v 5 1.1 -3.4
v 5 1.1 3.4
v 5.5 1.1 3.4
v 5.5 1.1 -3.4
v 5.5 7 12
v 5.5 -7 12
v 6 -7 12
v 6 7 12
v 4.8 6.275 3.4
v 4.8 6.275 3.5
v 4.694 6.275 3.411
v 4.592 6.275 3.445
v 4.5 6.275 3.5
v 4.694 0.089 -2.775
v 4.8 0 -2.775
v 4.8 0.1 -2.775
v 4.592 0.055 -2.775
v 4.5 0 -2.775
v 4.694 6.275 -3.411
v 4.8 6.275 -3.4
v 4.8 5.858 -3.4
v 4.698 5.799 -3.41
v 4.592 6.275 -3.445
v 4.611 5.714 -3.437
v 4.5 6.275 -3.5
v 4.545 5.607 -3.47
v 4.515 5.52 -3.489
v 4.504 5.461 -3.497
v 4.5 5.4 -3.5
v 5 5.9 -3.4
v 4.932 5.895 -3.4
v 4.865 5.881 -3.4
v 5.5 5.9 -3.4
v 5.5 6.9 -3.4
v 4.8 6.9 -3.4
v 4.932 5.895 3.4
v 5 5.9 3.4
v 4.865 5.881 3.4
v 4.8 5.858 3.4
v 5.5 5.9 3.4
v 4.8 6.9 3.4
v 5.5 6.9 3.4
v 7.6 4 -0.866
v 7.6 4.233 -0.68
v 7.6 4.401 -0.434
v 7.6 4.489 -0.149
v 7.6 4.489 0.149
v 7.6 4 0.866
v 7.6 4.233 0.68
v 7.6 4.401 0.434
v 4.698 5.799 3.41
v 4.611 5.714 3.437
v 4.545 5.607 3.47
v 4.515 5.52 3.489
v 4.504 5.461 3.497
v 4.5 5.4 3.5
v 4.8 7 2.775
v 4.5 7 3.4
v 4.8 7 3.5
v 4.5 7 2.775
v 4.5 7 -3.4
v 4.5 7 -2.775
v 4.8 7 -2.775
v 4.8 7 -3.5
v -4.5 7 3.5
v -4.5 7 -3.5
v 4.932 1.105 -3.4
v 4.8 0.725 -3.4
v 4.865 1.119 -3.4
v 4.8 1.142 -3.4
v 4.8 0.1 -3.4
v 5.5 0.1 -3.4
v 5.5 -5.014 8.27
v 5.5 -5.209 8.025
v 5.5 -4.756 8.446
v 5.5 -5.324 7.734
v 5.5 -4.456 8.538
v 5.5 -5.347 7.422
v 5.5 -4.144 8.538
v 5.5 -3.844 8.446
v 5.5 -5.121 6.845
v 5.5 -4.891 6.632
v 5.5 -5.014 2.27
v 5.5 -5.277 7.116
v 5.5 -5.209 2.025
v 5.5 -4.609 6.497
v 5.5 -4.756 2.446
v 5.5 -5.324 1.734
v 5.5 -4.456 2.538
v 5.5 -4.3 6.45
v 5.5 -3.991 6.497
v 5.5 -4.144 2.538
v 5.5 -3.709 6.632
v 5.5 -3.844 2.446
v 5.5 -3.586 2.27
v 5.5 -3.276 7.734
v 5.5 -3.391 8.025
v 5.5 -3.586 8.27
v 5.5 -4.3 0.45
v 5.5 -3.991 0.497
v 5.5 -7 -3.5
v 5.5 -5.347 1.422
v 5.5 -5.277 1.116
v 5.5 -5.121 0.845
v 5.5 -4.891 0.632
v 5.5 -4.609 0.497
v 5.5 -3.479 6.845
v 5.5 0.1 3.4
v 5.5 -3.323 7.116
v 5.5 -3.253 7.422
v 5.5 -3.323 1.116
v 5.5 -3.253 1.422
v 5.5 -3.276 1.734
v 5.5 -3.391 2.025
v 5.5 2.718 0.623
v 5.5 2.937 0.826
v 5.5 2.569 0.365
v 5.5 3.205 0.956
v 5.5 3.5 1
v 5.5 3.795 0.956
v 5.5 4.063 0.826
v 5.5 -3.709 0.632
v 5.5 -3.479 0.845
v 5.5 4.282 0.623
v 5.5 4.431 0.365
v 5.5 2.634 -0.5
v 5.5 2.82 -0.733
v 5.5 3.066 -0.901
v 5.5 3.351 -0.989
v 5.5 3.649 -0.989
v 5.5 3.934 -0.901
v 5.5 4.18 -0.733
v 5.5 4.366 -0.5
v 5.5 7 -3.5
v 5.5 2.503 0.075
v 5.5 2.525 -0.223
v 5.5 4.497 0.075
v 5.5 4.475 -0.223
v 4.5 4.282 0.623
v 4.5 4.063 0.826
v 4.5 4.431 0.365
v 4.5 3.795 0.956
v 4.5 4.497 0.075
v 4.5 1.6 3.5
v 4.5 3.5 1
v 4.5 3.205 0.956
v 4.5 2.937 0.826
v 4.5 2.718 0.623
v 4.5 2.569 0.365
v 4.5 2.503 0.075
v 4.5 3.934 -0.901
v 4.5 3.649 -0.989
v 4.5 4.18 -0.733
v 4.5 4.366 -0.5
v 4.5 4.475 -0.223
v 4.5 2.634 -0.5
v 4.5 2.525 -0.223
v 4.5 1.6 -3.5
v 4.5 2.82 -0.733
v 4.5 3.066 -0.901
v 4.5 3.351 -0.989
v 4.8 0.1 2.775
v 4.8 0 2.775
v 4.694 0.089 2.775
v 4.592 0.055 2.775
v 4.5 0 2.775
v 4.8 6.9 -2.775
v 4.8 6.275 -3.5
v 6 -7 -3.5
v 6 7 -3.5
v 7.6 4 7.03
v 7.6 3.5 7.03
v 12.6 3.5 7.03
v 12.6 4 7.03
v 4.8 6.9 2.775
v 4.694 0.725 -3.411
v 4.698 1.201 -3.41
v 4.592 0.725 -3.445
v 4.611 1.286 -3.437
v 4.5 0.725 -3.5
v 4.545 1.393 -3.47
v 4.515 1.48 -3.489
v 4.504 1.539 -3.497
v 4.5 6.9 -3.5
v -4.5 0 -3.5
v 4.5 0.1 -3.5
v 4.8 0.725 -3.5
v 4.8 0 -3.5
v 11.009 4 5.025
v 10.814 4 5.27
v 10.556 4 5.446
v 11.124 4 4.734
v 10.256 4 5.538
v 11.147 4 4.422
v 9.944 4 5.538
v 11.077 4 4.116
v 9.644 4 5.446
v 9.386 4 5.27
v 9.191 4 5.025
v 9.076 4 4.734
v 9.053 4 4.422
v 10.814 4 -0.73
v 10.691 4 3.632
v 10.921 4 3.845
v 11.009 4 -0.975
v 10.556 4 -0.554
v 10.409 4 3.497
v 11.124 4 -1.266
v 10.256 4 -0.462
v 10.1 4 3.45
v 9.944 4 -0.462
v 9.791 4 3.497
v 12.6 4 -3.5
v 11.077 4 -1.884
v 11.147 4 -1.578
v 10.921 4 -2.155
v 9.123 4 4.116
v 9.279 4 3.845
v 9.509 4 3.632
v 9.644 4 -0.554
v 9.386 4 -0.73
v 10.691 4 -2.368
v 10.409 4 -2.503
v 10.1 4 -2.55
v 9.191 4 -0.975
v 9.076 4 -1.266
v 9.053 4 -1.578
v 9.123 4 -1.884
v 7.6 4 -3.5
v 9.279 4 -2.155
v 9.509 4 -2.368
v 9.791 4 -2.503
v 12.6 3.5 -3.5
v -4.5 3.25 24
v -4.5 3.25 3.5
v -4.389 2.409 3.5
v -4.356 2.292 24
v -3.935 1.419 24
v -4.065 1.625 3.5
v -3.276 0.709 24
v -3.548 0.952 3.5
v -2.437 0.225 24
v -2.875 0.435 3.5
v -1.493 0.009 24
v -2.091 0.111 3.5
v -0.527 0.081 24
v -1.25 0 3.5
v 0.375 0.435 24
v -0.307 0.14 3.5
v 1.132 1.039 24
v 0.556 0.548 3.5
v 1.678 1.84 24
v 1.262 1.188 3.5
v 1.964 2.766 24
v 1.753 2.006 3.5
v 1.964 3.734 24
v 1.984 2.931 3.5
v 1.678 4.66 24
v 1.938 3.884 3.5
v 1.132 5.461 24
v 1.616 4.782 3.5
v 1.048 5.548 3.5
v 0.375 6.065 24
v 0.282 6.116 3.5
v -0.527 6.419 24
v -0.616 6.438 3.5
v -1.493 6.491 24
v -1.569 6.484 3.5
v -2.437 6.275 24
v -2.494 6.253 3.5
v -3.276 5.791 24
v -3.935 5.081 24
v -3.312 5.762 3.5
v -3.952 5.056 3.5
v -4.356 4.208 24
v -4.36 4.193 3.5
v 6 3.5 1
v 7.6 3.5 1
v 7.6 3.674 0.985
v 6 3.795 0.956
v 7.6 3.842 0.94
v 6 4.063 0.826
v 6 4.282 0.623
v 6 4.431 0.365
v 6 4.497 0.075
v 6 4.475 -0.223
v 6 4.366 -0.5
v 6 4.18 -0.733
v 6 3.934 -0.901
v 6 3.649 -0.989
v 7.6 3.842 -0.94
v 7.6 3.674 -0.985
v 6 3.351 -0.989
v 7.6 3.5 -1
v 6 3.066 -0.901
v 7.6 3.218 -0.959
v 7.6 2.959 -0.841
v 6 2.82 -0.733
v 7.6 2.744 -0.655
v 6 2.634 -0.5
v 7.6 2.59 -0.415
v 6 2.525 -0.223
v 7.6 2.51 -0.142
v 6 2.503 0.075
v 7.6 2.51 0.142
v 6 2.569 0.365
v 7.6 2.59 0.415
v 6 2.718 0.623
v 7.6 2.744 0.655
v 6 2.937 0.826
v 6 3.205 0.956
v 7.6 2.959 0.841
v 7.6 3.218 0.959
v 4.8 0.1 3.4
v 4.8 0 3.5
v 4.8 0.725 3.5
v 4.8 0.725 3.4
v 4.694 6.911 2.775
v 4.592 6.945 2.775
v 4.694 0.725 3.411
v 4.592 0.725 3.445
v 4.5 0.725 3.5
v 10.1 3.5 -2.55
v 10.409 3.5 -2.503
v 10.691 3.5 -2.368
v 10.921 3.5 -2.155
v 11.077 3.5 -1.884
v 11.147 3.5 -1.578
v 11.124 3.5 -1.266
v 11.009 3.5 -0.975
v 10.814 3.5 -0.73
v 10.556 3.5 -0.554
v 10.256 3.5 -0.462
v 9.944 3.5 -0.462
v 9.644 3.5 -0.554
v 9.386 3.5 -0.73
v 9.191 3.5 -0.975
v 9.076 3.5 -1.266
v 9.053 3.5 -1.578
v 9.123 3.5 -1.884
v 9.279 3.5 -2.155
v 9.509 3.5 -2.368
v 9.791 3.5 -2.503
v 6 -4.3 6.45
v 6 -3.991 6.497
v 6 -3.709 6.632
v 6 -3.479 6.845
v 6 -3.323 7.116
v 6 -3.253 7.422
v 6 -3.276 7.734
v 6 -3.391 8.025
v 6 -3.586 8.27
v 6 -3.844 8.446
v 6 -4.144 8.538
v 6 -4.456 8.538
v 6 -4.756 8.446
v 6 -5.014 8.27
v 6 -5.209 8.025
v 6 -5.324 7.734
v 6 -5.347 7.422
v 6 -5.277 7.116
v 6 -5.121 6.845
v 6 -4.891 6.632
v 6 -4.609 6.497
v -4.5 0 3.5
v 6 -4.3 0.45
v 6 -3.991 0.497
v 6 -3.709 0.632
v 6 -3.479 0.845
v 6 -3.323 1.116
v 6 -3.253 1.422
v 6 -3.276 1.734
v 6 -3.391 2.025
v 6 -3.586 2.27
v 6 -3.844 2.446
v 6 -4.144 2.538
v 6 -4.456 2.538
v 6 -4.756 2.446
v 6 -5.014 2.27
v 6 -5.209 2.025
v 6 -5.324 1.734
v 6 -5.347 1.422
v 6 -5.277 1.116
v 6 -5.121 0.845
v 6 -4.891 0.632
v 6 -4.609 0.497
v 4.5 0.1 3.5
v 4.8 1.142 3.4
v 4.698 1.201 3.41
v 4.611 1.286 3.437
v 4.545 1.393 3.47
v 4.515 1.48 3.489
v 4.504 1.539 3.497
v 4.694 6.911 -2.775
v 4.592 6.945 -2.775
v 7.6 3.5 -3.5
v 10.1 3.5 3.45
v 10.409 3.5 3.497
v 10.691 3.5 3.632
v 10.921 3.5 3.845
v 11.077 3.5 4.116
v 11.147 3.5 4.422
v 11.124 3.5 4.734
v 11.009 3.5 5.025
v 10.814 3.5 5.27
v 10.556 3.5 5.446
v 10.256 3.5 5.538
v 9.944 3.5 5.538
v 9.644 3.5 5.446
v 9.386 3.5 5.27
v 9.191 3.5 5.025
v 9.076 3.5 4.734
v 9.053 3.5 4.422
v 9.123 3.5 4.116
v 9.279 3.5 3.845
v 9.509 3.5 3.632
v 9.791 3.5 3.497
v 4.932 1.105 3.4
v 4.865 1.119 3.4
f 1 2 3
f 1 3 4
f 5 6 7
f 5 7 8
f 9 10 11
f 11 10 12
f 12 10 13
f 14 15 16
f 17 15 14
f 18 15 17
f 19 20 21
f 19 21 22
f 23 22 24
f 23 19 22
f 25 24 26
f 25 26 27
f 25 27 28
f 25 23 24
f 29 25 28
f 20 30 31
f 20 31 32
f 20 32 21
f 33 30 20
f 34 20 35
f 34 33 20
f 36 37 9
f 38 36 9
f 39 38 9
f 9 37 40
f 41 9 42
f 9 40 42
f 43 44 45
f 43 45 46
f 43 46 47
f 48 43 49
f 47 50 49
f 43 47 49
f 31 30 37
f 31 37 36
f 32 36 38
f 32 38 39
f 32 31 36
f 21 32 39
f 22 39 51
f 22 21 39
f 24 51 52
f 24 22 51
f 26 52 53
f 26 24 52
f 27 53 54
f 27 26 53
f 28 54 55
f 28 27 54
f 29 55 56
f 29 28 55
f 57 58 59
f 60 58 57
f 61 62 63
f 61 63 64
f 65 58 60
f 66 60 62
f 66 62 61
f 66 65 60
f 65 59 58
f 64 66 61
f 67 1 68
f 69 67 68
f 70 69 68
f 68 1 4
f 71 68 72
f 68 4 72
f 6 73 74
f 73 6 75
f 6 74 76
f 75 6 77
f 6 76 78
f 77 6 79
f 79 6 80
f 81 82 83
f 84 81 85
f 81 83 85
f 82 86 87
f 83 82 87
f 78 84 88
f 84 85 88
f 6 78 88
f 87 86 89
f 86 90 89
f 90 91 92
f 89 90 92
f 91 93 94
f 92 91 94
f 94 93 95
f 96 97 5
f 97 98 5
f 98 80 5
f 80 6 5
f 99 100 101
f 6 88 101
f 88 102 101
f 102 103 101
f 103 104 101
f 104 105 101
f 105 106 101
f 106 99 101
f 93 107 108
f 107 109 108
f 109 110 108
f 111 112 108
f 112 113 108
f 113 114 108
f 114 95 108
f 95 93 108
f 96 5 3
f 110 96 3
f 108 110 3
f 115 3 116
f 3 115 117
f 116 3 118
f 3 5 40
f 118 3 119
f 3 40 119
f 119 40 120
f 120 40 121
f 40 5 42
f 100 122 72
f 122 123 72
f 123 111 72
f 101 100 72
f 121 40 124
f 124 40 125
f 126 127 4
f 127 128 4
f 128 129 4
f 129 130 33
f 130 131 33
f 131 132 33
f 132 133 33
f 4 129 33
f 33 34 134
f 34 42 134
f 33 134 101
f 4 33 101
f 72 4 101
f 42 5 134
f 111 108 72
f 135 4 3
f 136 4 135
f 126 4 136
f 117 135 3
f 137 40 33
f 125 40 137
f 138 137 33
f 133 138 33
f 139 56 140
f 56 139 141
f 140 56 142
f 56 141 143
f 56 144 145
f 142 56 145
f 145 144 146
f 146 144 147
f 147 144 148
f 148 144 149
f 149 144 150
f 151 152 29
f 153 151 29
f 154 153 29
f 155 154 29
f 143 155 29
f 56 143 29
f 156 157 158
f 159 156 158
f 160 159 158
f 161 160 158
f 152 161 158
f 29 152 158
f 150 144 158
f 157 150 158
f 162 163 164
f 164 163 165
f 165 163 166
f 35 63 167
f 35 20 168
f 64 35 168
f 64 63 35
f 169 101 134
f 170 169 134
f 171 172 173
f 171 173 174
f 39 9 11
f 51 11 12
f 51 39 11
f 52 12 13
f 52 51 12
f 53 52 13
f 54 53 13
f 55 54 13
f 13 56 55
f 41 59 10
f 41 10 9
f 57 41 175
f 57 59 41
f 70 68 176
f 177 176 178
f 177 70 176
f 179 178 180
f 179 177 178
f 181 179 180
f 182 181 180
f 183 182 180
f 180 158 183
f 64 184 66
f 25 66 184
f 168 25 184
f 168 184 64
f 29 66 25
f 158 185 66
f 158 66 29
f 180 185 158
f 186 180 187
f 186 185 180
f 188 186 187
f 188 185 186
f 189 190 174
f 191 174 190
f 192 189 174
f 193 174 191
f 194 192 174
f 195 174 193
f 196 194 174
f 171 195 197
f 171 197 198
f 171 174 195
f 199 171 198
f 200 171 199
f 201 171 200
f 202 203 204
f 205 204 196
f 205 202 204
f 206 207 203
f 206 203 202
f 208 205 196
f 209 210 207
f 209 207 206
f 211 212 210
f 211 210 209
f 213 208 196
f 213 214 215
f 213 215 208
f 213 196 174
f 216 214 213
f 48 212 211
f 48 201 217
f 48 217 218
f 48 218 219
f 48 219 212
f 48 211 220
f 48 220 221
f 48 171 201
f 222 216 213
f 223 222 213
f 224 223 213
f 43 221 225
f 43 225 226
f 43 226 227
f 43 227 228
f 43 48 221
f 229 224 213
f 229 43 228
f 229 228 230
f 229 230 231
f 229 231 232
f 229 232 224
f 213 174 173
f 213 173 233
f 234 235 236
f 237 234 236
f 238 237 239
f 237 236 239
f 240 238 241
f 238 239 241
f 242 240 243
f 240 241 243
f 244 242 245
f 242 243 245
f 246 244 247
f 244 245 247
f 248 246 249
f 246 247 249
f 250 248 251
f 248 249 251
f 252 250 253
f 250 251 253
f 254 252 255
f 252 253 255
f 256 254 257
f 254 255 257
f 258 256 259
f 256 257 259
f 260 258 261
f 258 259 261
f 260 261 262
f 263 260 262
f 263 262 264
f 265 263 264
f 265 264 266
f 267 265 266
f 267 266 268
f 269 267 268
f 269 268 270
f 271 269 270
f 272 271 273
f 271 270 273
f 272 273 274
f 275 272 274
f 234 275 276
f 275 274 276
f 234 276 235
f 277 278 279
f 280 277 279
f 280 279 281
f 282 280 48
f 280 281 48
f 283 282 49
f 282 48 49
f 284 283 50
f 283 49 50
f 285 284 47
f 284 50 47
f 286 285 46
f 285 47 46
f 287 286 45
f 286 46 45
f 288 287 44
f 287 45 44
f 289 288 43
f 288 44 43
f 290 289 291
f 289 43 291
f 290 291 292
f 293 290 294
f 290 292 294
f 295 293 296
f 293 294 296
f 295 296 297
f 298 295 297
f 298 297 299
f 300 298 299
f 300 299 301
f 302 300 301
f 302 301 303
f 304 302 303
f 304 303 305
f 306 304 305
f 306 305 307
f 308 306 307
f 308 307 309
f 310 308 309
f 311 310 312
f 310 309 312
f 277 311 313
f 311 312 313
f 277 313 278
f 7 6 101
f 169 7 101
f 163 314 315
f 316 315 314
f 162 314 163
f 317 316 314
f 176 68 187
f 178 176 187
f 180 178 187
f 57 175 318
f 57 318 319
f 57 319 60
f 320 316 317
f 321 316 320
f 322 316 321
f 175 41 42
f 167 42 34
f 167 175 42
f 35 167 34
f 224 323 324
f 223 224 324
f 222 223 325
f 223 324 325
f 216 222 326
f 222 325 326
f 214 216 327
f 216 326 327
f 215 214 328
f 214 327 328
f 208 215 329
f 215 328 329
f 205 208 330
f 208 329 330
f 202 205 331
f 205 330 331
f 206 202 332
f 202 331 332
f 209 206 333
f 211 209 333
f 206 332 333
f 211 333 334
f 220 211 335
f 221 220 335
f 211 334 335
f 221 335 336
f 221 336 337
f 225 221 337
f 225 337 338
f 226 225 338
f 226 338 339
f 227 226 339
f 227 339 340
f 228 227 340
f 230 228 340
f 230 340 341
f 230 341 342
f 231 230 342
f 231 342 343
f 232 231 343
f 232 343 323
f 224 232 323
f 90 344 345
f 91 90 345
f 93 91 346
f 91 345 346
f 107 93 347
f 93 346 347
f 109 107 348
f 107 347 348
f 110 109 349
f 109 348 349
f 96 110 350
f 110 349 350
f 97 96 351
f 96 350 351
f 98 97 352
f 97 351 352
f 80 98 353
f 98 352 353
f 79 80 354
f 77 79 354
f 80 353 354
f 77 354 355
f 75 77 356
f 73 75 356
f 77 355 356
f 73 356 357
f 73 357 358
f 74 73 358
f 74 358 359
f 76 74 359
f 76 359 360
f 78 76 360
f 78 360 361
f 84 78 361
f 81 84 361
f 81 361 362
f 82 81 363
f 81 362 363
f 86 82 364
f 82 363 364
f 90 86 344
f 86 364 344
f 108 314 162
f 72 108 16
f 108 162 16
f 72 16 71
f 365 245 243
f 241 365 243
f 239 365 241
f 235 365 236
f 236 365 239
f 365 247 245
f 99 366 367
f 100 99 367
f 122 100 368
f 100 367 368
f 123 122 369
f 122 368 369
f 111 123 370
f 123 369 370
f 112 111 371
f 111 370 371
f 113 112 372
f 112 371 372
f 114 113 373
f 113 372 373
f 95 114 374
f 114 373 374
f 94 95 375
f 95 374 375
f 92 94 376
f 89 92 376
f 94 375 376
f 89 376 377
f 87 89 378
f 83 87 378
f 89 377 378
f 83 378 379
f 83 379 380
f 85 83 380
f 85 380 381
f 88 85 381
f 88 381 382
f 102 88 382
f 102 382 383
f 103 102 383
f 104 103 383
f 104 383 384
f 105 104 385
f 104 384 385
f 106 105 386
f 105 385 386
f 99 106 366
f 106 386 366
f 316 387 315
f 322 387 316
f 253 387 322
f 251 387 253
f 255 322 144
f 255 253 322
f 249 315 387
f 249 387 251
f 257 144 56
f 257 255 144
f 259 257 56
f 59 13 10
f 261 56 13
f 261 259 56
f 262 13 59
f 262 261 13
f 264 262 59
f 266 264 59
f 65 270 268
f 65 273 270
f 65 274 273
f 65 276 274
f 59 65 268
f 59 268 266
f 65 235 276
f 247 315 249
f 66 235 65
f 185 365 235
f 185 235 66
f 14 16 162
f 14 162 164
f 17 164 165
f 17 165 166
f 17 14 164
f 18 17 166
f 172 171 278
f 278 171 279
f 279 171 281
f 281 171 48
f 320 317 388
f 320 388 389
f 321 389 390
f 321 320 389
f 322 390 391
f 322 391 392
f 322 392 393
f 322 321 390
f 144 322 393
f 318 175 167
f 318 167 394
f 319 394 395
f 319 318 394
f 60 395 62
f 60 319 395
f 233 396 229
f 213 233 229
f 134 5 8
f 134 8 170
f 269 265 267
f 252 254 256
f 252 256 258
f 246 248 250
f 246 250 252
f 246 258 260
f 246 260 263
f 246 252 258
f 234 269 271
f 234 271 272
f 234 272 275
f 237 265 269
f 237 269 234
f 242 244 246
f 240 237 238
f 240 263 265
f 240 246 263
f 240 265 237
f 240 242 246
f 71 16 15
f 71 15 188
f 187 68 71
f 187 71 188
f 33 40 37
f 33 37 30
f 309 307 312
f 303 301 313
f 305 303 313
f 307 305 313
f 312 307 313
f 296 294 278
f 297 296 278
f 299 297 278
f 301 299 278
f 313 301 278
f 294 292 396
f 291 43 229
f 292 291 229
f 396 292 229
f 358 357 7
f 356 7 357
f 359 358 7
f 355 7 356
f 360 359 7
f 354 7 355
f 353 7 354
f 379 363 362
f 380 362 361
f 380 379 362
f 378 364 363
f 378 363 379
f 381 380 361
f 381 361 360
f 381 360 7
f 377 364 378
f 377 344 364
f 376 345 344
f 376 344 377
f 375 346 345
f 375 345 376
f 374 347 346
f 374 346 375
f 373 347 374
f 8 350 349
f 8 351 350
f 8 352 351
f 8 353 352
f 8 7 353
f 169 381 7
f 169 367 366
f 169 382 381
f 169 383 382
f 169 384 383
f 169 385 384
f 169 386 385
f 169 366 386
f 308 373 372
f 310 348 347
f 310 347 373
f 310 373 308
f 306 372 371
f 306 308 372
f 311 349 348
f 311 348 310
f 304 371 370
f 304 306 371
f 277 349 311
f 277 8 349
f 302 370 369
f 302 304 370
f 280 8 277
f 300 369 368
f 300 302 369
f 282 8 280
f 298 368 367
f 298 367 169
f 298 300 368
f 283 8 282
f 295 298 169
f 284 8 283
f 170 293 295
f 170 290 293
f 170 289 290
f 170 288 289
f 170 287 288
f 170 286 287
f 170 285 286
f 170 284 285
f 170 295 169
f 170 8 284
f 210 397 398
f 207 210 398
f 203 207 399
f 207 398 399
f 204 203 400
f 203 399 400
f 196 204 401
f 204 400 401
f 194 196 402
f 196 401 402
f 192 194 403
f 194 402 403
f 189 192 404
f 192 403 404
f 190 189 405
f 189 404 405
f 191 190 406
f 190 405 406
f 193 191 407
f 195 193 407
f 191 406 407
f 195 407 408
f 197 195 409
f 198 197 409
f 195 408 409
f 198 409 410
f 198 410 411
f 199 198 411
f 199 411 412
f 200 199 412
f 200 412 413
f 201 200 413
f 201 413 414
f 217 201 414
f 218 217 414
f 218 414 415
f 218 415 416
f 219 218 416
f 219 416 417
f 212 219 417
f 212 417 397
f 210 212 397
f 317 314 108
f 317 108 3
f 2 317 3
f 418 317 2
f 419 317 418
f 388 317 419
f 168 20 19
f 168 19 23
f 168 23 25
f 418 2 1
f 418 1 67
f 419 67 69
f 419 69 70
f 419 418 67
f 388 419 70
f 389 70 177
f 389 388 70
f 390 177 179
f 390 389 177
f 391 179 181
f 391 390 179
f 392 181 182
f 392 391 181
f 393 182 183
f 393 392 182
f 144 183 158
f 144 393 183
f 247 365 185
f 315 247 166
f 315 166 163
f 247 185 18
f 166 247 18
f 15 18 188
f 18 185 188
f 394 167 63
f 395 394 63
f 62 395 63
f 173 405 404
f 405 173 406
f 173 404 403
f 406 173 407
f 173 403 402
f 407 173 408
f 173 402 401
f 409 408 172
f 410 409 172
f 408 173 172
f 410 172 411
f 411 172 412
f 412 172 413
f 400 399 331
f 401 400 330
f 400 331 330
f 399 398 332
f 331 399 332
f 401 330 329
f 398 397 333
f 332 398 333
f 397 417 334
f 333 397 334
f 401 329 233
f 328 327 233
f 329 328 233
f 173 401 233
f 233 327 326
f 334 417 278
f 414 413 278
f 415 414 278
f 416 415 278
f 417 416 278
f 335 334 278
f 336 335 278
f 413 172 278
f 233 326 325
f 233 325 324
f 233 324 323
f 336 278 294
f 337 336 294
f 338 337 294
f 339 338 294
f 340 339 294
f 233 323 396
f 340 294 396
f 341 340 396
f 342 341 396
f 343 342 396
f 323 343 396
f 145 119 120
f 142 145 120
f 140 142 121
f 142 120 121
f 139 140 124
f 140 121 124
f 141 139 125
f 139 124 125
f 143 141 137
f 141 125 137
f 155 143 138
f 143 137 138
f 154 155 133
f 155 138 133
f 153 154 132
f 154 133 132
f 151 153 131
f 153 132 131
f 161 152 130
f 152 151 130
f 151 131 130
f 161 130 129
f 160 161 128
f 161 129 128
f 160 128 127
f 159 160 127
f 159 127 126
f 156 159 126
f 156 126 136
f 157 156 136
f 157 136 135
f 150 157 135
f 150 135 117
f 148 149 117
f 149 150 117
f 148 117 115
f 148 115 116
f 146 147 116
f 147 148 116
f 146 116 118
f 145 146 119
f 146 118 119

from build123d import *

# Parameters (mm, degrees)
SKETCH1_W            = 9
SKETCH1_H            = 7
BOSS_EXTRUDE1_DEPTH  = 7
SKETCH4_W            = 0.725
SKETCH4_H            = 0.725
BOSS_EXTRUDE3_DEPTH  = 0.3
SKETCH7_W            = 6.8
SKETCH7_H            = 1
BOSS_EXTRUDE5_DEPTH  = 1
FILLET1_R            = 0.5
SKETCH8_W            = 15.5
SKETCH8_H            = 14
BOSS_EXTRUDE6_DEPTH  = 0.5
EXTRUDE_9_DEPTH      = 10
EXTRUDE_9_DEPTH_BACK = 2.1
SKETCH_6_R           = 1
SKETCH10_W           = 10.53
SKETCH10_H           = 0.5
BOSS_EXTRUDE9_DEPTH  = 5
SKETCH_3_R           = 1.05
CUT_EXTRUDE_2_DEPTH  = 0.5
SKETCH_5_R           = 3.25
EXTRUDE_2_DEPTH      = 20.5
SKETCH_7_R           = 1.05
CUT_EXTRUDE_3_DEPTH  = 1.6


with BuildPart() as part:
    # Sketch1 → Boss-Extrude1 (new body)
    with BuildSketch(Plane(origin=(0, 0, 0), x_dir=(1, 0, 0), z_dir=(0, 1, 0))):
        Rectangle(SKETCH1_W, SKETCH1_H)
    extrude(amount=BOSS_EXTRUDE1_DEPTH)

    # Sketch4 → Boss-Extrude3 (add)
    with BuildSketch(Plane(origin=(4.5, 0, 0), x_dir=(0, 0, -1), z_dir=(1, 0, 0))):
        with Locations((-3.1375, 6.6375)):
            Rectangle(SKETCH4_W, SKETCH4_H)
        with Locations((3.1375, 6.6375)):
            Rectangle(SKETCH4_W, SKETCH4_H)
        with Locations((-3.1375, 0.3625)):
            Rectangle(SKETCH4_W, SKETCH4_H)
        with Locations((3.1375, 0.3625)):
            Rectangle(SKETCH4_W, SKETCH4_H)
    extrude(amount=BOSS_EXTRUDE3_DEPTH)

    # Sketch7 → Boss-Extrude5 (add)
    with BuildSketch(Plane(origin=(4.5, 0, 0), x_dir=(0, 0, -1), z_dir=(1, 0, 0))):
        with Locations((0, 0.6)):
            Rectangle(SKETCH7_W, SKETCH7_H)
        with Locations((0, 6.4)):
            Rectangle(SKETCH7_W, SKETCH7_H)
    extrude(amount=BOSS_EXTRUDE5_DEPTH)

    # Fillet1
    # the kernel refuses this fillet: 0.5 mm, written as the material it adds along each edge
    with BuildSketch(Plane(origin=(4.5, 6.9, 3.525), x_dir=(0, 1, 0), z_dir=(0, 0, -1))) as fillet1_piece_1_section:
        with BuildLine():
            CenterArc((0.5, 0.3), FILLET1_R, 180, 36.869897646)
            Line((0, 0.3), (0, 0))
            Line((0, 0), (0.1, 0))
        make_face()
    fillet1_piece_1 = extrude(amount=7.05, mode=Mode.PRIVATE)
    fillet1_piece_1 = split(fillet1_piece_1, bisect_by=Plane(origin=(4.5, 6.9, -3.4), z_dir=(0, 0, 1)), keep=Keep.TOP, mode=Mode.PRIVATE)
    fillet1_piece_1 = split(fillet1_piece_1, bisect_by=Plane(origin=(4.5, 6.9, 3.4), z_dir=(0, 0, -1)), keep=Keep.TOP, mode=Mode.PRIVATE)
    add(fillet1_piece_1)
    with BuildSketch(Plane(origin=(4.5, 5.9, 3.4), x_dir=(0, 0, 1), z_dir=(0, 1, 0))) as fillet1_piece_2:
        with BuildLine():
            CenterArc((0.5, 0.3), FILLET1_R, 180, 36.869897646)
            Line((0, 0.3), (0, 0))
            Line((0, 0), (0.1, 0))
        make_face()
    extrude(amount=0.375)
    with BuildSketch(Plane(origin=(4.5, 5.9, -3.4), x_dir=(0, -1, 0), z_dir=(0, 0, 1)), Plane(origin=(4.5, 1.1, 3.4), x_dir=(0, 1, 0), z_dir=(0, 0, -1))) as fillet1_piece_3:
        with BuildLine():
            CenterArc((FILLET1_R, FILLET1_R), FILLET1_R, 180, 90)
            Line((0, FILLET1_R), (0, 0))
            Line((0, 0), (FILLET1_R, 0))
        make_face()
    extrude(amount=6.8)
    with BuildSketch(Plane(origin=(4.5, 7.025, -3.4), x_dir=(0, 0, -1), z_dir=(0, -1, 0))) as fillet1_piece_4_section:
        with BuildLine():
            CenterArc((0.5, 0.3), FILLET1_R, 180, 36.869897646)
            Line((0, 0.3), (0, 0))
            Line((0, 0), (0.1, 0))
        make_face()
    fillet1_piece_4 = extrude(amount=1.125, mode=Mode.PRIVATE)
    fillet1_piece_4 = split(fillet1_piece_4, bisect_by=Plane(origin=(4.5, 6.9, -3.4), z_dir=(0, -1, 0)), keep=Keep.TOP, mode=Mode.PRIVATE)
    add(fillet1_piece_4)
    with BuildSketch(Plane(origin=(4.5, 1.1, -3.4), x_dir=(0, 0, -1), z_dir=(0, -1, 0))) as fillet1_piece_5_section:
        with BuildLine():
            CenterArc((0.5, 0.3), FILLET1_R, 180, 36.869897646)
            Line((0, 0.3), (0, 0))
            Line((0, 0), (0.1, 0))
        make_face()
    fillet1_piece_5 = extrude(amount=1.125, mode=Mode.PRIVATE)
    fillet1_piece_5 = split(fillet1_piece_5, bisect_by=Plane(origin=(4.5, 0.1, -3.4), z_dir=(0, 1, 0)), keep=Keep.TOP, mode=Mode.PRIVATE)
    add(fillet1_piece_5)
    with BuildSketch(Plane(origin=(4.5, -0.025, 3.4), x_dir=(0, 0, 1), z_dir=(0, 1, 0))) as fillet1_piece_6_section:
        with BuildLine():
            CenterArc((0.5, 0.3), FILLET1_R, 180, 36.869897646)
            Line((0, 0.3), (0, 0))
            Line((0, 0), (0.1, 0))
        make_face()
    fillet1_piece_6 = extrude(amount=1.125, mode=Mode.PRIVATE)
    fillet1_piece_6 = split(fillet1_piece_6, bisect_by=Plane(origin=(4.5, 0.1, 3.4), z_dir=(0, 1, 0)), keep=Keep.TOP, mode=Mode.PRIVATE)
    add(fillet1_piece_6)
    with BuildSketch(Plane(origin=(4.5, 0.1, -2.775), x_dir=(1, 0, 0), z_dir=(0, 0, 1))) as fillet1_piece_7:
        with BuildLine():
            CenterArc((0.3, -0.5), FILLET1_R, 90, 36.869897646)
            Line((0, -0.1), (0, 0))
            Line((0, 0), (0.3, 0))
        make_face()
    extrude(amount=5.55)
    with BuildSketch(Plane(origin=(4.5, 5.15, 3.4), x_dir=(0, 0, 1), z_dir=(0, 1, 0))) as fillet1_piece_8a_section:
        with BuildLine():
            CenterArc((0.5, 0.3), FILLET1_R, 180, 36.869897646)
            Line((0, 0.3), (0, 0))
            Line((0, 0), (0.1, 0))
        make_face()
    fillet1_piece_8a = extrude(amount=1.125, mode=Mode.PRIVATE)
    fillet1_piece_8a = split(fillet1_piece_8a, bisect_by=Plane(origin=(4.5, 5.9, 3.4), z_dir=(0, -1, 0)), keep=Keep.TOP, mode=Mode.PRIVATE)
    with BuildSketch(Plane(origin=(4.5, 5.9, -3.4), x_dir=(0, -1, 0), z_dir=(0, 0, 1))) as fillet1_piece_8b_section:
        with BuildLine():
            CenterArc((FILLET1_R, FILLET1_R), FILLET1_R, 180, 90)
            Line((0, FILLET1_R), (0, 0))
            Line((0, 0), (FILLET1_R, 0))
        make_face()
    fillet1_piece_8b = extrude(amount=8.05, mode=Mode.PRIVATE)
    fillet1_piece_8b = split(fillet1_piece_8b, bisect_by=Plane(origin=(4.5, 5.9, 3.5), z_dir=(0, 0, -1)), keep=Keep.TOP, mode=Mode.PRIVATE)
    fillet1_piece_8b = split(fillet1_piece_8b, bisect_by=Plane(origin=(4.5, 5.9, 3.4), z_dir=(0, 0, 1)), keep=Keep.TOP, mode=Mode.PRIVATE)
    fillet1_piece_8 = fillet1_piece_8a & fillet1_piece_8b
    add(fillet1_piece_8)
    with BuildSketch(Plane(origin=(4.5, 5.9, -4.65), x_dir=(0, -1, 0), z_dir=(0, 0, 1))) as fillet1_piece_9a_section:
        with BuildLine():
            CenterArc((FILLET1_R, FILLET1_R), FILLET1_R, 180, 90)
            Line((0, FILLET1_R), (0, 0))
            Line((0, 0), (FILLET1_R, 0))
        make_face()
    fillet1_piece_9a = extrude(amount=8.05, mode=Mode.PRIVATE)
    fillet1_piece_9a = split(fillet1_piece_9a, bisect_by=Plane(origin=(4.5, 5.9, -3.5), z_dir=(0, 0, 1)), keep=Keep.TOP, mode=Mode.PRIVATE)
    fillet1_piece_9a = split(fillet1_piece_9a, bisect_by=Plane(origin=(4.5, 5.9, -3.4), z_dir=(0, 0, -1)), keep=Keep.TOP, mode=Mode.PRIVATE)
    with BuildSketch(Plane(origin=(4.5, 6.275, -3.4), x_dir=(0, 0, -1), z_dir=(0, -1, 0))) as fillet1_piece_9b_section:
        with BuildLine():
            CenterArc((0.5, 0.3), FILLET1_R, 180, 36.869897646)
            Line((0, 0.3), (0, 0))
            Line((0, 0), (0.1, 0))
        make_face()
    fillet1_piece_9b = extrude(amount=1.125, mode=Mode.PRIVATE)
    fillet1_piece_9b = split(fillet1_piece_9b, bisect_by=Plane(origin=(4.5, 5.9, -3.4), z_dir=(0, -1, 0)), keep=Keep.TOP, mode=Mode.PRIVATE)
    fillet1_piece_9 = fillet1_piece_9a & fillet1_piece_9b
    add(fillet1_piece_9)
    with BuildSketch(Plane(origin=(4.5, 1.85, -3.4), x_dir=(0, 0, -1), z_dir=(0, -1, 0))) as fillet1_piece_10a_section:
        with BuildLine():
            CenterArc((0.5, 0.3), FILLET1_R, 180, 36.869897646)
            Line((0, 0.3), (0, 0))
            Line((0, 0), (0.1, 0))
        make_face()
    fillet1_piece_10a = extrude(amount=1.125, mode=Mode.PRIVATE)
    fillet1_piece_10a = split(fillet1_piece_10a, bisect_by=Plane(origin=(4.5, 1.1, -3.4), z_dir=(0, 1, 0)), keep=Keep.TOP, mode=Mode.PRIVATE)
    with BuildSketch(Plane(origin=(4.5, 1.1, 3.4), x_dir=(0, 1, 0), z_dir=(0, 0, -1))) as fillet1_piece_10b_section:
        with BuildLine():
            CenterArc((FILLET1_R, FILLET1_R), FILLET1_R, 180, 90)
            Line((0, FILLET1_R), (0, 0))
            Line((0, 0), (FILLET1_R, 0))
        make_face()
    fillet1_piece_10b = extrude(amount=8.05, mode=Mode.PRIVATE)
    fillet1_piece_10b = split(fillet1_piece_10b, bisect_by=Plane(origin=(4.5, 1.1, -3.5), z_dir=(0, 0, 1)), keep=Keep.TOP, mode=Mode.PRIVATE)
    fillet1_piece_10b = split(fillet1_piece_10b, bisect_by=Plane(origin=(4.5, 1.1, -3.4), z_dir=(0, 0, -1)), keep=Keep.TOP, mode=Mode.PRIVATE)
    fillet1_piece_10 = fillet1_piece_10a & fillet1_piece_10b
    add(fillet1_piece_10)
    with BuildSketch(Plane(origin=(4.5, 1.1, 4.65), x_dir=(0, 1, 0), z_dir=(0, 0, -1))) as fillet1_piece_11a_section:
        with BuildLine():
            CenterArc((FILLET1_R, FILLET1_R), FILLET1_R, 180, 90)
            Line((0, FILLET1_R), (0, 0))
            Line((0, 0), (FILLET1_R, 0))
        make_face()
    fillet1_piece_11a = extrude(amount=8.05, mode=Mode.PRIVATE)
    fillet1_piece_11a = split(fillet1_piece_11a, bisect_by=Plane(origin=(4.5, 1.1, 3.5), z_dir=(0, 0, -1)), keep=Keep.TOP, mode=Mode.PRIVATE)
    fillet1_piece_11a = split(fillet1_piece_11a, bisect_by=Plane(origin=(4.5, 1.1, 3.4), z_dir=(0, 0, 1)), keep=Keep.TOP, mode=Mode.PRIVATE)
    with BuildSketch(Plane(origin=(4.5, 0.725, 3.4), x_dir=(0, 0, 1), z_dir=(0, 1, 0))) as fillet1_piece_11b_section:
        with BuildLine():
            CenterArc((0.5, 0.3), FILLET1_R, 180, 36.869897646)
            Line((0, 0.3), (0, 0))
            Line((0, 0), (0.1, 0))
        make_face()
    fillet1_piece_11b = extrude(amount=1.125, mode=Mode.PRIVATE)
    fillet1_piece_11b = split(fillet1_piece_11b, bisect_by=Plane(origin=(4.5, 1.1, 3.4), z_dir=(0, 1, 0)), keep=Keep.TOP, mode=Mode.PRIVATE)
    fillet1_piece_11 = fillet1_piece_11a & fillet1_piece_11b
    add(fillet1_piece_11)

    # Sketch8 → Boss-Extrude6 (add)
    with BuildSketch(Plane(origin=(5.5, 0, 0), x_dir=(0, 0, -1), z_dir=(1, 0, 0))):
        with Locations((-4.25, 0)):
            Rectangle(SKETCH8_W, SKETCH8_H)
    extrude(amount=BOSS_EXTRUDE6_DEPTH)

    # ｽｹｯﾁ6 → ﾎﾞｽ - 押し出し9 (add, two sides: drawn at the far end of the back side and taken through both)
    with BuildSketch(Plane.ZY.offset(-5.5).offset(-EXTRUDE_9_DEPTH_BACK)):
        with Locations((0, 3.5)):
            Circle(SKETCH_6_R)
    extrude(amount=EXTRUDE_9_DEPTH + EXTRUDE_9_DEPTH_BACK)

    # Sketch10 → Boss-Extrude9 (add)
    with BuildSketch(Plane(origin=(7.6, 0, 0), x_dir=(0, 0, -1), z_dir=(1, 0, 0))):
        with Locations((-1.765, 3.75)):
            Rectangle(SKETCH10_W, SKETCH10_H)
    extrude(amount=BOSS_EXTRUDE9_DEPTH)

    # ｽｹｯﾁ3 → ｶｯﾄ - 押し出し2 (cut)
    with BuildSketch(Plane(origin=(6, 0, 0), x_dir=(0, 0, -1), z_dir=(1, 0, 0))):
        with Locations((-1.5, -4.3)):
            Circle(SKETCH_3_R)
        with Locations((-7.5, -4.3)):
            Circle(SKETCH_3_R)
    extrude(amount=-CUT_EXTRUDE_2_DEPTH, mode=Mode.SUBTRACT)

    # ｽｹｯﾁ5 → ﾎﾞｽ - 押し出し2 (add)
    with BuildSketch(Plane.XY.offset(3.5)):
        with Locations(Location((-1.25, 3.25, 0), (0, 0, 180))):
            Circle(SKETCH_5_R)
    extrude(amount=EXTRUDE_2_DEPTH)

    # ｽｹｯﾁ7 → ｶｯﾄ - 押し出し3 (cut)
    with BuildSketch(Plane(origin=(0, 3.5, 0), x_dir=(-1, 0, 0), z_dir=(0, -1, 0))):
        with Locations(Location((-10.1, -4.5, 0), (0, 0, 90))):
            Circle(SKETCH_7_R)
        with Locations(Location((-10.1, 1.5, 0), (0, 0, 90))):
            Circle(SKETCH_7_R)
    extrude(amount=-CUT_EXTRUDE_3_DEPTH, mode=Mode.SUBTRACT)


solid = part.part
